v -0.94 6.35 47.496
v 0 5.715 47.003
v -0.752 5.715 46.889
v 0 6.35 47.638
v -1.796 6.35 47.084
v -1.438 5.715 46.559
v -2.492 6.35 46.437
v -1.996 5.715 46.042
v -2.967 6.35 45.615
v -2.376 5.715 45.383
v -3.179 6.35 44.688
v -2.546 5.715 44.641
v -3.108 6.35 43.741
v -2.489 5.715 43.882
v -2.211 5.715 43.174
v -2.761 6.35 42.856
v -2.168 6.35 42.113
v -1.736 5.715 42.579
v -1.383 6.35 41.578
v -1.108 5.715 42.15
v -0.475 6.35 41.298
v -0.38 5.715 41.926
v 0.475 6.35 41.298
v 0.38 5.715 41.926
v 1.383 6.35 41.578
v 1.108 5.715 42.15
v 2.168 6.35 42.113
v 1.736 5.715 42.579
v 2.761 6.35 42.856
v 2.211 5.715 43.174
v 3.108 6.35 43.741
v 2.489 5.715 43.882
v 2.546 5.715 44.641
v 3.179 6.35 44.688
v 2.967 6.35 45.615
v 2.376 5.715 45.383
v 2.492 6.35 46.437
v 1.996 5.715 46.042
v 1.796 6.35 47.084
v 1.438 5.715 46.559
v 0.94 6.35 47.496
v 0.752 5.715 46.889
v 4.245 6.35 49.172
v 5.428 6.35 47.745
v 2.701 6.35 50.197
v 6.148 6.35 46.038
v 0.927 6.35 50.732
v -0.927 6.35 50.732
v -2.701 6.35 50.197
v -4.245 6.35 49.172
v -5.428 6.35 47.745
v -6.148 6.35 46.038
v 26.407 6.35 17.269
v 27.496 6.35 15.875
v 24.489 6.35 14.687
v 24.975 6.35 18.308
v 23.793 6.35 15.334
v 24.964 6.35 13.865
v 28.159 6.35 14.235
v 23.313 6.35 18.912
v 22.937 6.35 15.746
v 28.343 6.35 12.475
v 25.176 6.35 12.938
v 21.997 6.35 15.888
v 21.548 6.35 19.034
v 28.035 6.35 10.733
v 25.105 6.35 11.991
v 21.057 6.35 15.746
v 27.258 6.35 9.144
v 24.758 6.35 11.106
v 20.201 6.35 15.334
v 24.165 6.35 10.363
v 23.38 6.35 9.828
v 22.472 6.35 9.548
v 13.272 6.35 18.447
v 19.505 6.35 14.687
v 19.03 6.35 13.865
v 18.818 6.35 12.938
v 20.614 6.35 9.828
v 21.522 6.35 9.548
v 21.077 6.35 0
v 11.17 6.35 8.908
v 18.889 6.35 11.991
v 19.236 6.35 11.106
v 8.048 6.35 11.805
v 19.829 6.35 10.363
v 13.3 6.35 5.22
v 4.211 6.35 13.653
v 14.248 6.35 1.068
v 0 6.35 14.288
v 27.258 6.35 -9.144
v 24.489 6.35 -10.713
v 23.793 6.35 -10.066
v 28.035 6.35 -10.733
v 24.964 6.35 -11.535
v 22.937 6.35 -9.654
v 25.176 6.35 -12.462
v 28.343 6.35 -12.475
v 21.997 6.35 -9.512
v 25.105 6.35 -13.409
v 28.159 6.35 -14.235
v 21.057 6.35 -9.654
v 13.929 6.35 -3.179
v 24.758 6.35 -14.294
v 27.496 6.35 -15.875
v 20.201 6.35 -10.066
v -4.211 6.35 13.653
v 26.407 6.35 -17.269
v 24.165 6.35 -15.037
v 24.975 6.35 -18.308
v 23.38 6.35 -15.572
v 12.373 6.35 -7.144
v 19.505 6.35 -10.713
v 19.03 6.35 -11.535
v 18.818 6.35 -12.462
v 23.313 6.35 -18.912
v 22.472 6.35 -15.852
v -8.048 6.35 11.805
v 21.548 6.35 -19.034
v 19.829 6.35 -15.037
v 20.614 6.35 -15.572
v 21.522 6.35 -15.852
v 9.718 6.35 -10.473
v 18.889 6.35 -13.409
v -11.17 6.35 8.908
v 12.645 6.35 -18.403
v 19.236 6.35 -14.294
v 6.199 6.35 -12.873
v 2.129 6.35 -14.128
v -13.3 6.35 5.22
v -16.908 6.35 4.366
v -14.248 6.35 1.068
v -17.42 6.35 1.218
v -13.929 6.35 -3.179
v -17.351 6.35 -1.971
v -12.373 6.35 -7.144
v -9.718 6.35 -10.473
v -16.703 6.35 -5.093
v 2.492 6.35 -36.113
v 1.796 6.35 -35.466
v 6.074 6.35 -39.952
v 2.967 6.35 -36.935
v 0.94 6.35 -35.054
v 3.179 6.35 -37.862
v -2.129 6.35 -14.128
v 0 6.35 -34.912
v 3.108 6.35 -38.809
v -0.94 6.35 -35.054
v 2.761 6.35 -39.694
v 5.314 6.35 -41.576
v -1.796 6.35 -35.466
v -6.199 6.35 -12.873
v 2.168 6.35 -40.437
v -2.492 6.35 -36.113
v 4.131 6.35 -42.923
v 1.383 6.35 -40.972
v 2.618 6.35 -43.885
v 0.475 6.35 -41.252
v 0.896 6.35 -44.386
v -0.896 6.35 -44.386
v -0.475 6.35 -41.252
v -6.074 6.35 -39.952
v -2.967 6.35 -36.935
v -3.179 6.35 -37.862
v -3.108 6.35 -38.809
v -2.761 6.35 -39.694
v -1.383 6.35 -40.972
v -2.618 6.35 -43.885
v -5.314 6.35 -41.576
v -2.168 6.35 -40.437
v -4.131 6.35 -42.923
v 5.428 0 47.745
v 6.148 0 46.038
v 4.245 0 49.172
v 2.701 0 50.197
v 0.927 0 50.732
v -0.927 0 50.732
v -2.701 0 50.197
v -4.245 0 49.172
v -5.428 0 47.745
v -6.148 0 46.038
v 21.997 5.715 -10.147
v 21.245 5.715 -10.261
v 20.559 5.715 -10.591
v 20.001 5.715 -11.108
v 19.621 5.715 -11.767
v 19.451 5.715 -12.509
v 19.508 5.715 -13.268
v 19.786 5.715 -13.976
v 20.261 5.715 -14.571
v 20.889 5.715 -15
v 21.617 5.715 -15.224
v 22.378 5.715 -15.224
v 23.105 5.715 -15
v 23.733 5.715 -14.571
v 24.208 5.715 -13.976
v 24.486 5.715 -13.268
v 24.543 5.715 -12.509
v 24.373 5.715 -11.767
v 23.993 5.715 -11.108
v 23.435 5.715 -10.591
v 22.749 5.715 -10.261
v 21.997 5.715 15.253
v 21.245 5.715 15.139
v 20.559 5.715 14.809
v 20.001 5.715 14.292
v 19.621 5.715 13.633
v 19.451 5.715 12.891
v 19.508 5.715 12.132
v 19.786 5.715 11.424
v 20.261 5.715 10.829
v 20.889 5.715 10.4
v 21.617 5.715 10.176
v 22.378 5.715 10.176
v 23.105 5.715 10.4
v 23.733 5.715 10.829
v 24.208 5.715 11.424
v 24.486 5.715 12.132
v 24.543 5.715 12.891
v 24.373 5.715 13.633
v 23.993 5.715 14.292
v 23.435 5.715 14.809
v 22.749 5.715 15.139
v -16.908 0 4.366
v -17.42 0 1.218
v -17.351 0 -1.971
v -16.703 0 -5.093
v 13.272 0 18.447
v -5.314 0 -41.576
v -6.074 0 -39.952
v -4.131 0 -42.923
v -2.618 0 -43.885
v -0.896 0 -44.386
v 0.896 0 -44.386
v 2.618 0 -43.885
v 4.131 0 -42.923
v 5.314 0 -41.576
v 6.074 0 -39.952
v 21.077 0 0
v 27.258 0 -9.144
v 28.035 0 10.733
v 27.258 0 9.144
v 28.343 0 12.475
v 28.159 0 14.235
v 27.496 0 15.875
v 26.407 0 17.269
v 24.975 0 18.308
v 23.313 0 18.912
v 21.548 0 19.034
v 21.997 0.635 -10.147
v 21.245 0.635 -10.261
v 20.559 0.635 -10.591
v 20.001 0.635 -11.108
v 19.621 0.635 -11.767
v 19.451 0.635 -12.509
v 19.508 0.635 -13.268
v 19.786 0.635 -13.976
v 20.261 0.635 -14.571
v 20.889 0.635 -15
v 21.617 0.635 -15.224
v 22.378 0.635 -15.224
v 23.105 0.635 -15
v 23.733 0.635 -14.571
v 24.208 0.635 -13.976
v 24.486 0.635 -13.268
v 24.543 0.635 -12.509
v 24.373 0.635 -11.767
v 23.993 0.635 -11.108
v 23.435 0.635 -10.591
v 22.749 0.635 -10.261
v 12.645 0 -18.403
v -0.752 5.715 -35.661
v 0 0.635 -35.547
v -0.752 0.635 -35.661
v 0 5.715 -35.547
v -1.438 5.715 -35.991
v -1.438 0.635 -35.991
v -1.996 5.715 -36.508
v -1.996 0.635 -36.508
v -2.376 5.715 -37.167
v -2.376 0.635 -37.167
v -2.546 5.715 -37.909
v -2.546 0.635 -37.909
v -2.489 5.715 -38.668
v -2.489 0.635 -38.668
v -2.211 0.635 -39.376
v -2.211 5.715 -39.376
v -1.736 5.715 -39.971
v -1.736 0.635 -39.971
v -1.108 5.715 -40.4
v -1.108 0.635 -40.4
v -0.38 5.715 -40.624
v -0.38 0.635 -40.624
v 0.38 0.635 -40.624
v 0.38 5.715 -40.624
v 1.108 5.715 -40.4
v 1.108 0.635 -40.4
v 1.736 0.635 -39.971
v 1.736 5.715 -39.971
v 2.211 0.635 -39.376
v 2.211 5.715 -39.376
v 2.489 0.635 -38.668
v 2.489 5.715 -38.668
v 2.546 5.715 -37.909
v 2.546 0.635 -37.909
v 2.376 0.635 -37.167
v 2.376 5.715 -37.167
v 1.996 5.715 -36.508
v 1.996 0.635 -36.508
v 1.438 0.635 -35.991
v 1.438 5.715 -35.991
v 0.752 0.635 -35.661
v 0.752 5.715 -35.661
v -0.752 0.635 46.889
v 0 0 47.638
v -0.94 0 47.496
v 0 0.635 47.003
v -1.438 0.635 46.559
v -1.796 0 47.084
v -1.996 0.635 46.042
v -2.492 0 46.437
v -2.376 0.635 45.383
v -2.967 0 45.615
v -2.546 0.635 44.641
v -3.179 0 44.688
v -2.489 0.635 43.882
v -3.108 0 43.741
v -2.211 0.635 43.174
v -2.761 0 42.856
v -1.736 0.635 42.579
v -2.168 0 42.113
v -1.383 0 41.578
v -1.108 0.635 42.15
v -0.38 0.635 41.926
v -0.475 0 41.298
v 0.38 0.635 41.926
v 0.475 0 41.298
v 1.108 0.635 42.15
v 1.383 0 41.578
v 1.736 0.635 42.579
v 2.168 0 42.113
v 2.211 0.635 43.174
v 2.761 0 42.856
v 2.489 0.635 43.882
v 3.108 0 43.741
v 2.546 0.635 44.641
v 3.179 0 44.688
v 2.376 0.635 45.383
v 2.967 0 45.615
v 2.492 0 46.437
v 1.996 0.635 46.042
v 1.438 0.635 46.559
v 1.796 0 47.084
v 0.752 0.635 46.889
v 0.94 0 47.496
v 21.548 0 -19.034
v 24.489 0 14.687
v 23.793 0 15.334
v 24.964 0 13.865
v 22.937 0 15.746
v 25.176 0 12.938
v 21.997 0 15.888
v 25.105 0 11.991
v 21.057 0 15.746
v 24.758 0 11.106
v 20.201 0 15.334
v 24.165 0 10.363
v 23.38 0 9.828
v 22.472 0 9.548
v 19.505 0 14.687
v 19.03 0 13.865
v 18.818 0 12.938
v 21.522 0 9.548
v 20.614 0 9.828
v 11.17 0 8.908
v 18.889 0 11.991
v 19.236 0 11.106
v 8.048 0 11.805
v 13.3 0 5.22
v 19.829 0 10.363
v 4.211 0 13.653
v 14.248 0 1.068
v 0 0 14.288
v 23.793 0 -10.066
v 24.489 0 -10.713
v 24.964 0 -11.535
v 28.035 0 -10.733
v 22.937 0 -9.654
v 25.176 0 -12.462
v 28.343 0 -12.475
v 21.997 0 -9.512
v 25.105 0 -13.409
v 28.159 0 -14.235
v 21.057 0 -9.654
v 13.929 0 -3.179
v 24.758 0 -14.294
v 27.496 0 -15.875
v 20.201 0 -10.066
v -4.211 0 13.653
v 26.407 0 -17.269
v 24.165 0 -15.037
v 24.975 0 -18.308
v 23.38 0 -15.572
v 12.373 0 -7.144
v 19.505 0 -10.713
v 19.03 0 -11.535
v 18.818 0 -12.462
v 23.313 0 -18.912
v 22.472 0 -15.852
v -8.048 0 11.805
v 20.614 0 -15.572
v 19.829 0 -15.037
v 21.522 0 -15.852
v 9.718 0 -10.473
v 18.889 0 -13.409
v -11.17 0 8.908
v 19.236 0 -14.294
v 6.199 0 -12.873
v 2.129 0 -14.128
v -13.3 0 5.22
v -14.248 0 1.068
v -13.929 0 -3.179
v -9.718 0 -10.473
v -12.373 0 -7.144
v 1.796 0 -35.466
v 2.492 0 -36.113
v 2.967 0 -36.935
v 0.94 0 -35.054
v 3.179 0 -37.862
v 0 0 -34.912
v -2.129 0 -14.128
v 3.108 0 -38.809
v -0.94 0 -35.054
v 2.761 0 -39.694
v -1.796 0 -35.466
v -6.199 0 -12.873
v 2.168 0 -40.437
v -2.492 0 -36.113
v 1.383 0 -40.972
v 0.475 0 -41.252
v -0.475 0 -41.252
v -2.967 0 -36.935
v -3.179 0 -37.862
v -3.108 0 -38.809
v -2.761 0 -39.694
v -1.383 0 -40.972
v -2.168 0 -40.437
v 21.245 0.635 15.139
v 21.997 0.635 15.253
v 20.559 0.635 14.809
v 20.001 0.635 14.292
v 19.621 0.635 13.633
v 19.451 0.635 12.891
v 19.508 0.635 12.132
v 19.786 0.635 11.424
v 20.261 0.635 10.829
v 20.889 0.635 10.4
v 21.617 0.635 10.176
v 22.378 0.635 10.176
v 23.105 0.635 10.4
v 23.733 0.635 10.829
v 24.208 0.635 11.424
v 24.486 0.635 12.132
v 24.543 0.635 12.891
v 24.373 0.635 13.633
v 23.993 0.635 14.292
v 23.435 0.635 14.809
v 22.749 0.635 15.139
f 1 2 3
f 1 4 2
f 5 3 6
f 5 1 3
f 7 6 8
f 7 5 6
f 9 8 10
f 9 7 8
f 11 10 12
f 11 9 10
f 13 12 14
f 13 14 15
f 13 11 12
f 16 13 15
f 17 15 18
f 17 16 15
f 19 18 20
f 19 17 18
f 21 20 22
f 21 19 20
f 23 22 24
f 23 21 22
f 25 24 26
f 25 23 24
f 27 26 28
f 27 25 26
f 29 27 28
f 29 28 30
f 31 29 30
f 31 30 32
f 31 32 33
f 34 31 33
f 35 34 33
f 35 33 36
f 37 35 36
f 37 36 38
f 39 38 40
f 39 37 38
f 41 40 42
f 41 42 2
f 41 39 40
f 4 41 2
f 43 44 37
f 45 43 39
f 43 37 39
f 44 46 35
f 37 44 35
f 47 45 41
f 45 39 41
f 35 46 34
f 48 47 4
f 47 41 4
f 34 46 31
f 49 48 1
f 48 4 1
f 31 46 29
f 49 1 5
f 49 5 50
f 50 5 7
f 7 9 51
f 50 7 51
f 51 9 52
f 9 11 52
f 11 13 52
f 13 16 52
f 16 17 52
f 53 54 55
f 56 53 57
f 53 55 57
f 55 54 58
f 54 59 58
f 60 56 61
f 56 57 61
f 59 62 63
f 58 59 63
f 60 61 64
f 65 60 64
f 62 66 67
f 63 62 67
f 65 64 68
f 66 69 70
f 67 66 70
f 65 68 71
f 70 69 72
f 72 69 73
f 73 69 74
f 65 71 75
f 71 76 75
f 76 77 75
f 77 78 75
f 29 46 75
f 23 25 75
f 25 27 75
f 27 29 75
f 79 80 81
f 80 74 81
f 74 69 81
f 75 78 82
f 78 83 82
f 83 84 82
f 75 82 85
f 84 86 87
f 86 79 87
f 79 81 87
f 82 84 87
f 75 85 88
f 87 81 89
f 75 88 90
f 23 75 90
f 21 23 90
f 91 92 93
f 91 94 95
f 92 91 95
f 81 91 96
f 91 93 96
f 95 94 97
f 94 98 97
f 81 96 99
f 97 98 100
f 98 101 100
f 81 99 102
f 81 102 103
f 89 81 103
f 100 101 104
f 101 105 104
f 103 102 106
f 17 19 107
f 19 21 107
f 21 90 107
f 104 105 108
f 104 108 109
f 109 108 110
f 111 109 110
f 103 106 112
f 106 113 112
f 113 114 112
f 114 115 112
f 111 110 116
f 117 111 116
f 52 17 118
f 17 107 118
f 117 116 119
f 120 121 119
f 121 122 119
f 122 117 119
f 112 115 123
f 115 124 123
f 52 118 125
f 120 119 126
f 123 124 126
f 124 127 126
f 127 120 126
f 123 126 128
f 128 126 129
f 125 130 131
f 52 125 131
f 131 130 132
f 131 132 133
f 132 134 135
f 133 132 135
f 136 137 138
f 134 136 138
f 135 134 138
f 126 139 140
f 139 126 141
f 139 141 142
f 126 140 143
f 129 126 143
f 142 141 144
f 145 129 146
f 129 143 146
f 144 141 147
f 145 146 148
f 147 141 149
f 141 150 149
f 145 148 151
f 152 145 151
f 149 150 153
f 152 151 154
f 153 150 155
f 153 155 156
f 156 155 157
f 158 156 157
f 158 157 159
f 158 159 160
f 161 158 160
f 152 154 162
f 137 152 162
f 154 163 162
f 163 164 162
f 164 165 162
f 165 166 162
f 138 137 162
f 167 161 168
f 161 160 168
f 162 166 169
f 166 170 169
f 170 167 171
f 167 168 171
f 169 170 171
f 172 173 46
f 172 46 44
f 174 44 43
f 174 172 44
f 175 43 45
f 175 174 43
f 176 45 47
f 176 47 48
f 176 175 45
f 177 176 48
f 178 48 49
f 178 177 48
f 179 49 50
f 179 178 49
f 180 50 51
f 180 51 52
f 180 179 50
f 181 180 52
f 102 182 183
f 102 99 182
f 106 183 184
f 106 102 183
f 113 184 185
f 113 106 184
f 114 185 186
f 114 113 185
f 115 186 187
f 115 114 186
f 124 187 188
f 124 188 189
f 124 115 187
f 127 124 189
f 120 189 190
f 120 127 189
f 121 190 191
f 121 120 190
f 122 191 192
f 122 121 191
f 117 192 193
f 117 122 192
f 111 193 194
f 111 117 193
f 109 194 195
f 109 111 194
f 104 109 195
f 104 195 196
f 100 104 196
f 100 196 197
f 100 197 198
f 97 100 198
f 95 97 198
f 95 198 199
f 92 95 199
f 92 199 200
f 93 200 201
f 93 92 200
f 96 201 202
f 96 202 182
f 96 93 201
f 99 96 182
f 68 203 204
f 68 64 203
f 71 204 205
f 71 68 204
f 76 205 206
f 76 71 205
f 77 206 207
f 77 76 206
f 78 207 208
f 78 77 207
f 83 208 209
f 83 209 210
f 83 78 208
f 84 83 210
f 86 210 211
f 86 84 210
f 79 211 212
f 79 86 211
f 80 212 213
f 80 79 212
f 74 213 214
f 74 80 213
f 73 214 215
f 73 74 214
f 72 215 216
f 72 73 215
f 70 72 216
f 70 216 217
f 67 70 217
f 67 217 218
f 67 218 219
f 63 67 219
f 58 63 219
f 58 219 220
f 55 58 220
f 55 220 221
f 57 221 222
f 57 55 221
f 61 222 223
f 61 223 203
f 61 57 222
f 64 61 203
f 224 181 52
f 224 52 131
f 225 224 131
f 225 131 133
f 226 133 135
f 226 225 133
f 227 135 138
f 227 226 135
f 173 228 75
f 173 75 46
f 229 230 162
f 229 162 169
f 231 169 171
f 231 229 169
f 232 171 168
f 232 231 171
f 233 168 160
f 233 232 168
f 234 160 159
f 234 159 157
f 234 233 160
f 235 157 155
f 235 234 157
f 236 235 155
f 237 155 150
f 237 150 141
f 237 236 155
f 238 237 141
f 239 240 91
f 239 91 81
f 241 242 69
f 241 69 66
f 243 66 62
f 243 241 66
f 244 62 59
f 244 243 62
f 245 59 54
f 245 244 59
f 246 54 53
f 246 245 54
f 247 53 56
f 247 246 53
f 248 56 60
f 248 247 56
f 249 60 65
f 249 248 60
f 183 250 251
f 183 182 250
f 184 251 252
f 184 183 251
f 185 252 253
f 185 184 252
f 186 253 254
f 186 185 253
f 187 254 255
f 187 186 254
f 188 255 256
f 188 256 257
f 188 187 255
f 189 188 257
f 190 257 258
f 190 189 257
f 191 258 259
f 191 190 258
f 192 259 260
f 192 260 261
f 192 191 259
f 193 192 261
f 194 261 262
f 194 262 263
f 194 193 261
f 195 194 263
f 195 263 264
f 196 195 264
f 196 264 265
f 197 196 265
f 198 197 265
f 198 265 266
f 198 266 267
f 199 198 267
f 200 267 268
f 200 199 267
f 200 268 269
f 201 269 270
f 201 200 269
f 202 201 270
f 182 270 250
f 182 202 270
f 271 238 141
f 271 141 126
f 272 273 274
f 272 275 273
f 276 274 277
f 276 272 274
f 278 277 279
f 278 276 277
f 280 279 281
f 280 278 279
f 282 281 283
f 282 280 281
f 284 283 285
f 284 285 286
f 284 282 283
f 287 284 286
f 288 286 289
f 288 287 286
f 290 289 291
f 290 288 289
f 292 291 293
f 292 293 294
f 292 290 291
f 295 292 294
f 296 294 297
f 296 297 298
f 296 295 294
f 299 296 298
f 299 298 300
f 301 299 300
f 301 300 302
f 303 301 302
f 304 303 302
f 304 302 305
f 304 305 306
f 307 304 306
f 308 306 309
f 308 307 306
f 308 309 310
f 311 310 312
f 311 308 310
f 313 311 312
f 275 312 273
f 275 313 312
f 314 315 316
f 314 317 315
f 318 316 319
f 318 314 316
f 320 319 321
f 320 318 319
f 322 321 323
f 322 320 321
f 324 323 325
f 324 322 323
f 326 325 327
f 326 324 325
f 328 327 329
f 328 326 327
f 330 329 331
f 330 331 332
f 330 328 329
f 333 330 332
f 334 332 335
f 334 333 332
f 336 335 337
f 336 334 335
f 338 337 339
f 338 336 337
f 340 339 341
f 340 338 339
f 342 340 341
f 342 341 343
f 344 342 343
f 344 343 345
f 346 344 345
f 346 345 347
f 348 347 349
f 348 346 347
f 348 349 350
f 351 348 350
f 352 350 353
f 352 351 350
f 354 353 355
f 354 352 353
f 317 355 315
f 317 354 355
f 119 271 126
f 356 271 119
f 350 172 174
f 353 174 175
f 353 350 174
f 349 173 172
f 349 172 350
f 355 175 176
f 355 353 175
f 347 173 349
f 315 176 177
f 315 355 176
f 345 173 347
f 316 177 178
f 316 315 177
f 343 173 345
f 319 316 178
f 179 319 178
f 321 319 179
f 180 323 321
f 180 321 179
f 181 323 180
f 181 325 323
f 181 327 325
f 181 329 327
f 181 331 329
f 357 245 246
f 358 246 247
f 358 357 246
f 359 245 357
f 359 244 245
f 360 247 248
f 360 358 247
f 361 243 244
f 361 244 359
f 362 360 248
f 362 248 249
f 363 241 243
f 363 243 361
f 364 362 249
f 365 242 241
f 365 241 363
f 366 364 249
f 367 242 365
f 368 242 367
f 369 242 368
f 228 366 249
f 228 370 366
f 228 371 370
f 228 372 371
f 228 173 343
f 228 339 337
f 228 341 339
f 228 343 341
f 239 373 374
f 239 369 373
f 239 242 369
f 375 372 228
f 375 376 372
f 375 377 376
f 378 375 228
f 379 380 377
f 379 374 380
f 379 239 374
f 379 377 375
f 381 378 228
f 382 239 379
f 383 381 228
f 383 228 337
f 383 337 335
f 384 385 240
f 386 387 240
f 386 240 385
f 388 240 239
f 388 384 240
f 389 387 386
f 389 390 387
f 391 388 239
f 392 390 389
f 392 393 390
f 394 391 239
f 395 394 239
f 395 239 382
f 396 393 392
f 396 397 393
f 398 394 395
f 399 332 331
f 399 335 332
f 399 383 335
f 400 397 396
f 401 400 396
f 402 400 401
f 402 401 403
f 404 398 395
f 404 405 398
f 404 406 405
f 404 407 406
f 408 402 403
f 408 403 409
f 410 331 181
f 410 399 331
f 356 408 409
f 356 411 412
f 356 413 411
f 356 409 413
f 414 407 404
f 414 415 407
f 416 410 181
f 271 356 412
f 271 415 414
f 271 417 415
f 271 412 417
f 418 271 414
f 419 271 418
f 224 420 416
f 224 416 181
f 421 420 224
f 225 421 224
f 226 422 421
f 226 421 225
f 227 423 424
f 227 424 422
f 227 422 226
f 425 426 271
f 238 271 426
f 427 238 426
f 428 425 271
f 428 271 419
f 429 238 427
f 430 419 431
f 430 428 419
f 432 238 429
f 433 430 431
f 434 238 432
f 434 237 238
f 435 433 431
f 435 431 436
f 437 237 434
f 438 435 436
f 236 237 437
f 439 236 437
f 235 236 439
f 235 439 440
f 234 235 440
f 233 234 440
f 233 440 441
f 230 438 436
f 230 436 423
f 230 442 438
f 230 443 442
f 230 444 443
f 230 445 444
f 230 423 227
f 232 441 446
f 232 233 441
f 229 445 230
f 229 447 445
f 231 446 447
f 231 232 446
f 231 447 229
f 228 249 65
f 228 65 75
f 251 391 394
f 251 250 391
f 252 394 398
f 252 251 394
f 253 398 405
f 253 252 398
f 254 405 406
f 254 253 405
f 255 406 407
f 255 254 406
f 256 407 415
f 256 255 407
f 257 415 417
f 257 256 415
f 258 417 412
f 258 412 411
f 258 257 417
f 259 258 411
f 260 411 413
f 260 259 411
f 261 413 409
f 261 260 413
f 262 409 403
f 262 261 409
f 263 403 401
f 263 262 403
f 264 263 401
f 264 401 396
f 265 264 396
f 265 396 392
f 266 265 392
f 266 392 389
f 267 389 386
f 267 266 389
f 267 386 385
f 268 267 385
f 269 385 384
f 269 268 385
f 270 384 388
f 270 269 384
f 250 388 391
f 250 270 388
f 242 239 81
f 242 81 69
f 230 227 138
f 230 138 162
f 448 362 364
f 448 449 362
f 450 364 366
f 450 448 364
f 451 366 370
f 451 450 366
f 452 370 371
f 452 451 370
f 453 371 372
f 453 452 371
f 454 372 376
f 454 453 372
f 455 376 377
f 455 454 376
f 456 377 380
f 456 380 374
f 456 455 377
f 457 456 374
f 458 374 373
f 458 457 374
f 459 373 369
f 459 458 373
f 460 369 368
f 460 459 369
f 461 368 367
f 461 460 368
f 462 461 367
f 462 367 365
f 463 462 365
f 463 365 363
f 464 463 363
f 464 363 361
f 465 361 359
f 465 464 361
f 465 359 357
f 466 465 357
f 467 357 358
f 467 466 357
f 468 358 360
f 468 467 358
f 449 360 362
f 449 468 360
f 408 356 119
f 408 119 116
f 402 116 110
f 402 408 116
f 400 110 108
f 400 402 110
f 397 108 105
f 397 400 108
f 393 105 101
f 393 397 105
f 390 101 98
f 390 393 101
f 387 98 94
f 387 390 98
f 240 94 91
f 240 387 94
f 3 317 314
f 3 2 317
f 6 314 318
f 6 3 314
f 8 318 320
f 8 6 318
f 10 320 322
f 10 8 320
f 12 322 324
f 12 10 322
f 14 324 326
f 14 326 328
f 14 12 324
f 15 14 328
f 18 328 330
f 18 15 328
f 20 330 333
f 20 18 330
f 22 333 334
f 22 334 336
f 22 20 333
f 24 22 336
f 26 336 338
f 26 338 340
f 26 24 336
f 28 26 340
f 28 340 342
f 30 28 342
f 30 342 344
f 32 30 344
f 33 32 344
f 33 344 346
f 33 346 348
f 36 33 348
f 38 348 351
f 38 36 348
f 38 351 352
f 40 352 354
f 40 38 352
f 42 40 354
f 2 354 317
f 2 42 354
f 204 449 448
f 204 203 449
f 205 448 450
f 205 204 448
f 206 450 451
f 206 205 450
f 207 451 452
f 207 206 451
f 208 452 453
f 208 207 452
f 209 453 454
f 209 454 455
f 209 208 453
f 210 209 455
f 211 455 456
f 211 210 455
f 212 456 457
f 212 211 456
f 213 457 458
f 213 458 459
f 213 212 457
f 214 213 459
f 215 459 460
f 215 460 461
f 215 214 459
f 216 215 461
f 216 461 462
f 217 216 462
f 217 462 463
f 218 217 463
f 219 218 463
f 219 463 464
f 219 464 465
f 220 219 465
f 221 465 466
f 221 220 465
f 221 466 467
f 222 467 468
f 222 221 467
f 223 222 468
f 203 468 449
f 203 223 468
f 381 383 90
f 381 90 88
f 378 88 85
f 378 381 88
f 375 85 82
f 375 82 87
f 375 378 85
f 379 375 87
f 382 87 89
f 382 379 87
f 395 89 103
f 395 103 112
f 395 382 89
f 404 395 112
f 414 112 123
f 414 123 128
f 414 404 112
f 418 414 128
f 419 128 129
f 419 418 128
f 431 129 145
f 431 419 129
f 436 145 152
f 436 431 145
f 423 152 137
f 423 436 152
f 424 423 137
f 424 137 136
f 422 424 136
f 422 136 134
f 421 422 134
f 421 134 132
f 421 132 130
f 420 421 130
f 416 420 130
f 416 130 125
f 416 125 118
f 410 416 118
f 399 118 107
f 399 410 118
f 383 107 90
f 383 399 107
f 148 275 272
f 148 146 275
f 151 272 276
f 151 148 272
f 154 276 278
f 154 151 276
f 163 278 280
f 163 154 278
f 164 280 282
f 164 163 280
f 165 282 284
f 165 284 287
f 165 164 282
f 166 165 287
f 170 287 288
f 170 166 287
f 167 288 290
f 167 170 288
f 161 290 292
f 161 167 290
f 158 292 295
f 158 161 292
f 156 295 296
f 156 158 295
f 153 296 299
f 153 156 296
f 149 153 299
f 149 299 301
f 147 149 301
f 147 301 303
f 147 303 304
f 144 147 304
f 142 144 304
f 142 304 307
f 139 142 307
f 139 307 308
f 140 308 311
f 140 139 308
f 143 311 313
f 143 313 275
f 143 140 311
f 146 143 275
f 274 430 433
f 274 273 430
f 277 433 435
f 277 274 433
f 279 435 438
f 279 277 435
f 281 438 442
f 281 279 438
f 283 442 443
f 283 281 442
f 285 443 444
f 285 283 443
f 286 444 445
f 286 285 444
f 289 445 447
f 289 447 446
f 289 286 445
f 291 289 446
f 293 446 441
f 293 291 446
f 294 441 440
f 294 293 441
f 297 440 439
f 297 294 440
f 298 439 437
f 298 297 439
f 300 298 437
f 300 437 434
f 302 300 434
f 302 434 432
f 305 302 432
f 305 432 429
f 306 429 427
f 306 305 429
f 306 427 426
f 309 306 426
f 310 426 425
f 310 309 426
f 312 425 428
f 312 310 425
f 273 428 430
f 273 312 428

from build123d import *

# Parameters (mm, degrees)
SKETCH1_R                       = 14.2875
BOSS_EXTRUDE1_DEPTH             = 6.35
F_10_CLEARANCE_HOLE1_AT_2_COUNT = 2
F_10_CLEARANCE_HOLE1_AT_2_PITCH = 38.625542067
F_10_CLEARANCE_HOLE1_AT_3_COUNT = 2
F_10_CLEARANCE_HOLE1_AT_3_PITCH = 61.237182332
F_10_CLEARANCE_HOLE1_AT_4_COUNT = 2
F_10_CLEARANCE_HOLE1_AT_4_PITCH = 82.55


with BuildPart() as part:
    # Sketch1 → Boss-Extrude1 (new body)
    with BuildSketch(Plane(origin=(0, 0, 0), x_dir=(1, 0, 0), z_dir=(0, 1, 0))):
        with BuildLine():
            Line((-16.703230912, 5.093229167), (-6.07390215, 39.952083333))
            ThreePointArc((-6.07390215, 39.952083333), (0, 44.45), (6.07390215, 39.952083333))
            Line((6.07390215, 39.952083333), (12.644794548, 18.402859955))
            Line((12.644794548, 18.402859955), (21.547953627, 19.034099518))
            ThreePointArc((21.547953627, 19.034099518), (27.49630657, 15.875), (27.257990535, 9.144025482))
            Line((27.257990535, 9.144025482), (21.077367113, 0))
            Line((21.077367113, 0), (27.257990535, -9.144025482))
            ThreePointArc((27.257990535, -9.144025482), (27.49630657, -15.875), (21.547953627, -19.034099518))
            Line((21.547953627, -19.034099518), (13.272110504, -18.44733705))
            Line((13.272110504, -18.44733705), (6.148361062, -46.0375))
            ThreePointArc((6.148361062, -46.0375), (0, -50.8), (-6.148361062, -46.0375))
            Line((-6.148361062, -46.0375), (-16.907992921, -4.365625))
            ThreePointArc((-16.907992921, -4.365625), (-17.458409791, 0.377933626), (-16.703230912, 5.093229167))
        make_face()
        with Locations(Location((0, 0, 0), (0, 0, 270))):
            Circle(SKETCH1_R, mode=Mode.SUBTRACT)
    extrude(amount=BOSS_EXTRUDE1_DEPTH)

    # Sketch3 → #10 Clearance Hole1 (revolve, cut)
    with BuildSketch(Plane(origin=(0, 6.35, 44.45), x_dir=(0, 0, 1), z_dir=(1, 0, 0))):
        Polygon((0, 0), (0, 6.35), (3.1877, 6.35), (2.5527, 5.715), (2.5527, 0.635), (3.1877, 0), align=None)
    f_10_clearance_hole1 = revolve(axis=Axis((0, 12.7, 44.45), (0, -1, 0)), mode=Mode.SUBTRACT)

    # #10 Clearance Hole1 at 2: #10 Clearance Hole1 ×2
    with Locations(*[Vector(0.5694947974514997, 0, -0.8219949365267863) * (i * F_10_CLEARANCE_HOLE1_AT_2_PITCH) for i in range(1, F_10_CLEARANCE_HOLE1_AT_2_COUNT)]):
        add(f_10_clearance_hole1, mode=Mode.SUBTRACT)

    # #10 Clearance Hole1 at 3: #10 Clearance Hole1 ×2
    with Locations(*[Vector(0.3592106040535505, 0, -0.9332565252573826) * (i * F_10_CLEARANCE_HOLE1_AT_3_PITCH) for i in range(1, F_10_CLEARANCE_HOLE1_AT_3_COUNT)]):
        add(f_10_clearance_hole1, mode=Mode.SUBTRACT)

    # #10 Clearance Hole1 at 4: #10 Clearance Hole1 ×2
    with Locations(*[(0, 0, -i * F_10_CLEARANCE_HOLE1_AT_4_PITCH) for i in range(1, F_10_CLEARANCE_HOLE1_AT_4_COUNT)]):
        add(f_10_clearance_hole1, mode=Mode.SUBTRACT)


solid = part.part
